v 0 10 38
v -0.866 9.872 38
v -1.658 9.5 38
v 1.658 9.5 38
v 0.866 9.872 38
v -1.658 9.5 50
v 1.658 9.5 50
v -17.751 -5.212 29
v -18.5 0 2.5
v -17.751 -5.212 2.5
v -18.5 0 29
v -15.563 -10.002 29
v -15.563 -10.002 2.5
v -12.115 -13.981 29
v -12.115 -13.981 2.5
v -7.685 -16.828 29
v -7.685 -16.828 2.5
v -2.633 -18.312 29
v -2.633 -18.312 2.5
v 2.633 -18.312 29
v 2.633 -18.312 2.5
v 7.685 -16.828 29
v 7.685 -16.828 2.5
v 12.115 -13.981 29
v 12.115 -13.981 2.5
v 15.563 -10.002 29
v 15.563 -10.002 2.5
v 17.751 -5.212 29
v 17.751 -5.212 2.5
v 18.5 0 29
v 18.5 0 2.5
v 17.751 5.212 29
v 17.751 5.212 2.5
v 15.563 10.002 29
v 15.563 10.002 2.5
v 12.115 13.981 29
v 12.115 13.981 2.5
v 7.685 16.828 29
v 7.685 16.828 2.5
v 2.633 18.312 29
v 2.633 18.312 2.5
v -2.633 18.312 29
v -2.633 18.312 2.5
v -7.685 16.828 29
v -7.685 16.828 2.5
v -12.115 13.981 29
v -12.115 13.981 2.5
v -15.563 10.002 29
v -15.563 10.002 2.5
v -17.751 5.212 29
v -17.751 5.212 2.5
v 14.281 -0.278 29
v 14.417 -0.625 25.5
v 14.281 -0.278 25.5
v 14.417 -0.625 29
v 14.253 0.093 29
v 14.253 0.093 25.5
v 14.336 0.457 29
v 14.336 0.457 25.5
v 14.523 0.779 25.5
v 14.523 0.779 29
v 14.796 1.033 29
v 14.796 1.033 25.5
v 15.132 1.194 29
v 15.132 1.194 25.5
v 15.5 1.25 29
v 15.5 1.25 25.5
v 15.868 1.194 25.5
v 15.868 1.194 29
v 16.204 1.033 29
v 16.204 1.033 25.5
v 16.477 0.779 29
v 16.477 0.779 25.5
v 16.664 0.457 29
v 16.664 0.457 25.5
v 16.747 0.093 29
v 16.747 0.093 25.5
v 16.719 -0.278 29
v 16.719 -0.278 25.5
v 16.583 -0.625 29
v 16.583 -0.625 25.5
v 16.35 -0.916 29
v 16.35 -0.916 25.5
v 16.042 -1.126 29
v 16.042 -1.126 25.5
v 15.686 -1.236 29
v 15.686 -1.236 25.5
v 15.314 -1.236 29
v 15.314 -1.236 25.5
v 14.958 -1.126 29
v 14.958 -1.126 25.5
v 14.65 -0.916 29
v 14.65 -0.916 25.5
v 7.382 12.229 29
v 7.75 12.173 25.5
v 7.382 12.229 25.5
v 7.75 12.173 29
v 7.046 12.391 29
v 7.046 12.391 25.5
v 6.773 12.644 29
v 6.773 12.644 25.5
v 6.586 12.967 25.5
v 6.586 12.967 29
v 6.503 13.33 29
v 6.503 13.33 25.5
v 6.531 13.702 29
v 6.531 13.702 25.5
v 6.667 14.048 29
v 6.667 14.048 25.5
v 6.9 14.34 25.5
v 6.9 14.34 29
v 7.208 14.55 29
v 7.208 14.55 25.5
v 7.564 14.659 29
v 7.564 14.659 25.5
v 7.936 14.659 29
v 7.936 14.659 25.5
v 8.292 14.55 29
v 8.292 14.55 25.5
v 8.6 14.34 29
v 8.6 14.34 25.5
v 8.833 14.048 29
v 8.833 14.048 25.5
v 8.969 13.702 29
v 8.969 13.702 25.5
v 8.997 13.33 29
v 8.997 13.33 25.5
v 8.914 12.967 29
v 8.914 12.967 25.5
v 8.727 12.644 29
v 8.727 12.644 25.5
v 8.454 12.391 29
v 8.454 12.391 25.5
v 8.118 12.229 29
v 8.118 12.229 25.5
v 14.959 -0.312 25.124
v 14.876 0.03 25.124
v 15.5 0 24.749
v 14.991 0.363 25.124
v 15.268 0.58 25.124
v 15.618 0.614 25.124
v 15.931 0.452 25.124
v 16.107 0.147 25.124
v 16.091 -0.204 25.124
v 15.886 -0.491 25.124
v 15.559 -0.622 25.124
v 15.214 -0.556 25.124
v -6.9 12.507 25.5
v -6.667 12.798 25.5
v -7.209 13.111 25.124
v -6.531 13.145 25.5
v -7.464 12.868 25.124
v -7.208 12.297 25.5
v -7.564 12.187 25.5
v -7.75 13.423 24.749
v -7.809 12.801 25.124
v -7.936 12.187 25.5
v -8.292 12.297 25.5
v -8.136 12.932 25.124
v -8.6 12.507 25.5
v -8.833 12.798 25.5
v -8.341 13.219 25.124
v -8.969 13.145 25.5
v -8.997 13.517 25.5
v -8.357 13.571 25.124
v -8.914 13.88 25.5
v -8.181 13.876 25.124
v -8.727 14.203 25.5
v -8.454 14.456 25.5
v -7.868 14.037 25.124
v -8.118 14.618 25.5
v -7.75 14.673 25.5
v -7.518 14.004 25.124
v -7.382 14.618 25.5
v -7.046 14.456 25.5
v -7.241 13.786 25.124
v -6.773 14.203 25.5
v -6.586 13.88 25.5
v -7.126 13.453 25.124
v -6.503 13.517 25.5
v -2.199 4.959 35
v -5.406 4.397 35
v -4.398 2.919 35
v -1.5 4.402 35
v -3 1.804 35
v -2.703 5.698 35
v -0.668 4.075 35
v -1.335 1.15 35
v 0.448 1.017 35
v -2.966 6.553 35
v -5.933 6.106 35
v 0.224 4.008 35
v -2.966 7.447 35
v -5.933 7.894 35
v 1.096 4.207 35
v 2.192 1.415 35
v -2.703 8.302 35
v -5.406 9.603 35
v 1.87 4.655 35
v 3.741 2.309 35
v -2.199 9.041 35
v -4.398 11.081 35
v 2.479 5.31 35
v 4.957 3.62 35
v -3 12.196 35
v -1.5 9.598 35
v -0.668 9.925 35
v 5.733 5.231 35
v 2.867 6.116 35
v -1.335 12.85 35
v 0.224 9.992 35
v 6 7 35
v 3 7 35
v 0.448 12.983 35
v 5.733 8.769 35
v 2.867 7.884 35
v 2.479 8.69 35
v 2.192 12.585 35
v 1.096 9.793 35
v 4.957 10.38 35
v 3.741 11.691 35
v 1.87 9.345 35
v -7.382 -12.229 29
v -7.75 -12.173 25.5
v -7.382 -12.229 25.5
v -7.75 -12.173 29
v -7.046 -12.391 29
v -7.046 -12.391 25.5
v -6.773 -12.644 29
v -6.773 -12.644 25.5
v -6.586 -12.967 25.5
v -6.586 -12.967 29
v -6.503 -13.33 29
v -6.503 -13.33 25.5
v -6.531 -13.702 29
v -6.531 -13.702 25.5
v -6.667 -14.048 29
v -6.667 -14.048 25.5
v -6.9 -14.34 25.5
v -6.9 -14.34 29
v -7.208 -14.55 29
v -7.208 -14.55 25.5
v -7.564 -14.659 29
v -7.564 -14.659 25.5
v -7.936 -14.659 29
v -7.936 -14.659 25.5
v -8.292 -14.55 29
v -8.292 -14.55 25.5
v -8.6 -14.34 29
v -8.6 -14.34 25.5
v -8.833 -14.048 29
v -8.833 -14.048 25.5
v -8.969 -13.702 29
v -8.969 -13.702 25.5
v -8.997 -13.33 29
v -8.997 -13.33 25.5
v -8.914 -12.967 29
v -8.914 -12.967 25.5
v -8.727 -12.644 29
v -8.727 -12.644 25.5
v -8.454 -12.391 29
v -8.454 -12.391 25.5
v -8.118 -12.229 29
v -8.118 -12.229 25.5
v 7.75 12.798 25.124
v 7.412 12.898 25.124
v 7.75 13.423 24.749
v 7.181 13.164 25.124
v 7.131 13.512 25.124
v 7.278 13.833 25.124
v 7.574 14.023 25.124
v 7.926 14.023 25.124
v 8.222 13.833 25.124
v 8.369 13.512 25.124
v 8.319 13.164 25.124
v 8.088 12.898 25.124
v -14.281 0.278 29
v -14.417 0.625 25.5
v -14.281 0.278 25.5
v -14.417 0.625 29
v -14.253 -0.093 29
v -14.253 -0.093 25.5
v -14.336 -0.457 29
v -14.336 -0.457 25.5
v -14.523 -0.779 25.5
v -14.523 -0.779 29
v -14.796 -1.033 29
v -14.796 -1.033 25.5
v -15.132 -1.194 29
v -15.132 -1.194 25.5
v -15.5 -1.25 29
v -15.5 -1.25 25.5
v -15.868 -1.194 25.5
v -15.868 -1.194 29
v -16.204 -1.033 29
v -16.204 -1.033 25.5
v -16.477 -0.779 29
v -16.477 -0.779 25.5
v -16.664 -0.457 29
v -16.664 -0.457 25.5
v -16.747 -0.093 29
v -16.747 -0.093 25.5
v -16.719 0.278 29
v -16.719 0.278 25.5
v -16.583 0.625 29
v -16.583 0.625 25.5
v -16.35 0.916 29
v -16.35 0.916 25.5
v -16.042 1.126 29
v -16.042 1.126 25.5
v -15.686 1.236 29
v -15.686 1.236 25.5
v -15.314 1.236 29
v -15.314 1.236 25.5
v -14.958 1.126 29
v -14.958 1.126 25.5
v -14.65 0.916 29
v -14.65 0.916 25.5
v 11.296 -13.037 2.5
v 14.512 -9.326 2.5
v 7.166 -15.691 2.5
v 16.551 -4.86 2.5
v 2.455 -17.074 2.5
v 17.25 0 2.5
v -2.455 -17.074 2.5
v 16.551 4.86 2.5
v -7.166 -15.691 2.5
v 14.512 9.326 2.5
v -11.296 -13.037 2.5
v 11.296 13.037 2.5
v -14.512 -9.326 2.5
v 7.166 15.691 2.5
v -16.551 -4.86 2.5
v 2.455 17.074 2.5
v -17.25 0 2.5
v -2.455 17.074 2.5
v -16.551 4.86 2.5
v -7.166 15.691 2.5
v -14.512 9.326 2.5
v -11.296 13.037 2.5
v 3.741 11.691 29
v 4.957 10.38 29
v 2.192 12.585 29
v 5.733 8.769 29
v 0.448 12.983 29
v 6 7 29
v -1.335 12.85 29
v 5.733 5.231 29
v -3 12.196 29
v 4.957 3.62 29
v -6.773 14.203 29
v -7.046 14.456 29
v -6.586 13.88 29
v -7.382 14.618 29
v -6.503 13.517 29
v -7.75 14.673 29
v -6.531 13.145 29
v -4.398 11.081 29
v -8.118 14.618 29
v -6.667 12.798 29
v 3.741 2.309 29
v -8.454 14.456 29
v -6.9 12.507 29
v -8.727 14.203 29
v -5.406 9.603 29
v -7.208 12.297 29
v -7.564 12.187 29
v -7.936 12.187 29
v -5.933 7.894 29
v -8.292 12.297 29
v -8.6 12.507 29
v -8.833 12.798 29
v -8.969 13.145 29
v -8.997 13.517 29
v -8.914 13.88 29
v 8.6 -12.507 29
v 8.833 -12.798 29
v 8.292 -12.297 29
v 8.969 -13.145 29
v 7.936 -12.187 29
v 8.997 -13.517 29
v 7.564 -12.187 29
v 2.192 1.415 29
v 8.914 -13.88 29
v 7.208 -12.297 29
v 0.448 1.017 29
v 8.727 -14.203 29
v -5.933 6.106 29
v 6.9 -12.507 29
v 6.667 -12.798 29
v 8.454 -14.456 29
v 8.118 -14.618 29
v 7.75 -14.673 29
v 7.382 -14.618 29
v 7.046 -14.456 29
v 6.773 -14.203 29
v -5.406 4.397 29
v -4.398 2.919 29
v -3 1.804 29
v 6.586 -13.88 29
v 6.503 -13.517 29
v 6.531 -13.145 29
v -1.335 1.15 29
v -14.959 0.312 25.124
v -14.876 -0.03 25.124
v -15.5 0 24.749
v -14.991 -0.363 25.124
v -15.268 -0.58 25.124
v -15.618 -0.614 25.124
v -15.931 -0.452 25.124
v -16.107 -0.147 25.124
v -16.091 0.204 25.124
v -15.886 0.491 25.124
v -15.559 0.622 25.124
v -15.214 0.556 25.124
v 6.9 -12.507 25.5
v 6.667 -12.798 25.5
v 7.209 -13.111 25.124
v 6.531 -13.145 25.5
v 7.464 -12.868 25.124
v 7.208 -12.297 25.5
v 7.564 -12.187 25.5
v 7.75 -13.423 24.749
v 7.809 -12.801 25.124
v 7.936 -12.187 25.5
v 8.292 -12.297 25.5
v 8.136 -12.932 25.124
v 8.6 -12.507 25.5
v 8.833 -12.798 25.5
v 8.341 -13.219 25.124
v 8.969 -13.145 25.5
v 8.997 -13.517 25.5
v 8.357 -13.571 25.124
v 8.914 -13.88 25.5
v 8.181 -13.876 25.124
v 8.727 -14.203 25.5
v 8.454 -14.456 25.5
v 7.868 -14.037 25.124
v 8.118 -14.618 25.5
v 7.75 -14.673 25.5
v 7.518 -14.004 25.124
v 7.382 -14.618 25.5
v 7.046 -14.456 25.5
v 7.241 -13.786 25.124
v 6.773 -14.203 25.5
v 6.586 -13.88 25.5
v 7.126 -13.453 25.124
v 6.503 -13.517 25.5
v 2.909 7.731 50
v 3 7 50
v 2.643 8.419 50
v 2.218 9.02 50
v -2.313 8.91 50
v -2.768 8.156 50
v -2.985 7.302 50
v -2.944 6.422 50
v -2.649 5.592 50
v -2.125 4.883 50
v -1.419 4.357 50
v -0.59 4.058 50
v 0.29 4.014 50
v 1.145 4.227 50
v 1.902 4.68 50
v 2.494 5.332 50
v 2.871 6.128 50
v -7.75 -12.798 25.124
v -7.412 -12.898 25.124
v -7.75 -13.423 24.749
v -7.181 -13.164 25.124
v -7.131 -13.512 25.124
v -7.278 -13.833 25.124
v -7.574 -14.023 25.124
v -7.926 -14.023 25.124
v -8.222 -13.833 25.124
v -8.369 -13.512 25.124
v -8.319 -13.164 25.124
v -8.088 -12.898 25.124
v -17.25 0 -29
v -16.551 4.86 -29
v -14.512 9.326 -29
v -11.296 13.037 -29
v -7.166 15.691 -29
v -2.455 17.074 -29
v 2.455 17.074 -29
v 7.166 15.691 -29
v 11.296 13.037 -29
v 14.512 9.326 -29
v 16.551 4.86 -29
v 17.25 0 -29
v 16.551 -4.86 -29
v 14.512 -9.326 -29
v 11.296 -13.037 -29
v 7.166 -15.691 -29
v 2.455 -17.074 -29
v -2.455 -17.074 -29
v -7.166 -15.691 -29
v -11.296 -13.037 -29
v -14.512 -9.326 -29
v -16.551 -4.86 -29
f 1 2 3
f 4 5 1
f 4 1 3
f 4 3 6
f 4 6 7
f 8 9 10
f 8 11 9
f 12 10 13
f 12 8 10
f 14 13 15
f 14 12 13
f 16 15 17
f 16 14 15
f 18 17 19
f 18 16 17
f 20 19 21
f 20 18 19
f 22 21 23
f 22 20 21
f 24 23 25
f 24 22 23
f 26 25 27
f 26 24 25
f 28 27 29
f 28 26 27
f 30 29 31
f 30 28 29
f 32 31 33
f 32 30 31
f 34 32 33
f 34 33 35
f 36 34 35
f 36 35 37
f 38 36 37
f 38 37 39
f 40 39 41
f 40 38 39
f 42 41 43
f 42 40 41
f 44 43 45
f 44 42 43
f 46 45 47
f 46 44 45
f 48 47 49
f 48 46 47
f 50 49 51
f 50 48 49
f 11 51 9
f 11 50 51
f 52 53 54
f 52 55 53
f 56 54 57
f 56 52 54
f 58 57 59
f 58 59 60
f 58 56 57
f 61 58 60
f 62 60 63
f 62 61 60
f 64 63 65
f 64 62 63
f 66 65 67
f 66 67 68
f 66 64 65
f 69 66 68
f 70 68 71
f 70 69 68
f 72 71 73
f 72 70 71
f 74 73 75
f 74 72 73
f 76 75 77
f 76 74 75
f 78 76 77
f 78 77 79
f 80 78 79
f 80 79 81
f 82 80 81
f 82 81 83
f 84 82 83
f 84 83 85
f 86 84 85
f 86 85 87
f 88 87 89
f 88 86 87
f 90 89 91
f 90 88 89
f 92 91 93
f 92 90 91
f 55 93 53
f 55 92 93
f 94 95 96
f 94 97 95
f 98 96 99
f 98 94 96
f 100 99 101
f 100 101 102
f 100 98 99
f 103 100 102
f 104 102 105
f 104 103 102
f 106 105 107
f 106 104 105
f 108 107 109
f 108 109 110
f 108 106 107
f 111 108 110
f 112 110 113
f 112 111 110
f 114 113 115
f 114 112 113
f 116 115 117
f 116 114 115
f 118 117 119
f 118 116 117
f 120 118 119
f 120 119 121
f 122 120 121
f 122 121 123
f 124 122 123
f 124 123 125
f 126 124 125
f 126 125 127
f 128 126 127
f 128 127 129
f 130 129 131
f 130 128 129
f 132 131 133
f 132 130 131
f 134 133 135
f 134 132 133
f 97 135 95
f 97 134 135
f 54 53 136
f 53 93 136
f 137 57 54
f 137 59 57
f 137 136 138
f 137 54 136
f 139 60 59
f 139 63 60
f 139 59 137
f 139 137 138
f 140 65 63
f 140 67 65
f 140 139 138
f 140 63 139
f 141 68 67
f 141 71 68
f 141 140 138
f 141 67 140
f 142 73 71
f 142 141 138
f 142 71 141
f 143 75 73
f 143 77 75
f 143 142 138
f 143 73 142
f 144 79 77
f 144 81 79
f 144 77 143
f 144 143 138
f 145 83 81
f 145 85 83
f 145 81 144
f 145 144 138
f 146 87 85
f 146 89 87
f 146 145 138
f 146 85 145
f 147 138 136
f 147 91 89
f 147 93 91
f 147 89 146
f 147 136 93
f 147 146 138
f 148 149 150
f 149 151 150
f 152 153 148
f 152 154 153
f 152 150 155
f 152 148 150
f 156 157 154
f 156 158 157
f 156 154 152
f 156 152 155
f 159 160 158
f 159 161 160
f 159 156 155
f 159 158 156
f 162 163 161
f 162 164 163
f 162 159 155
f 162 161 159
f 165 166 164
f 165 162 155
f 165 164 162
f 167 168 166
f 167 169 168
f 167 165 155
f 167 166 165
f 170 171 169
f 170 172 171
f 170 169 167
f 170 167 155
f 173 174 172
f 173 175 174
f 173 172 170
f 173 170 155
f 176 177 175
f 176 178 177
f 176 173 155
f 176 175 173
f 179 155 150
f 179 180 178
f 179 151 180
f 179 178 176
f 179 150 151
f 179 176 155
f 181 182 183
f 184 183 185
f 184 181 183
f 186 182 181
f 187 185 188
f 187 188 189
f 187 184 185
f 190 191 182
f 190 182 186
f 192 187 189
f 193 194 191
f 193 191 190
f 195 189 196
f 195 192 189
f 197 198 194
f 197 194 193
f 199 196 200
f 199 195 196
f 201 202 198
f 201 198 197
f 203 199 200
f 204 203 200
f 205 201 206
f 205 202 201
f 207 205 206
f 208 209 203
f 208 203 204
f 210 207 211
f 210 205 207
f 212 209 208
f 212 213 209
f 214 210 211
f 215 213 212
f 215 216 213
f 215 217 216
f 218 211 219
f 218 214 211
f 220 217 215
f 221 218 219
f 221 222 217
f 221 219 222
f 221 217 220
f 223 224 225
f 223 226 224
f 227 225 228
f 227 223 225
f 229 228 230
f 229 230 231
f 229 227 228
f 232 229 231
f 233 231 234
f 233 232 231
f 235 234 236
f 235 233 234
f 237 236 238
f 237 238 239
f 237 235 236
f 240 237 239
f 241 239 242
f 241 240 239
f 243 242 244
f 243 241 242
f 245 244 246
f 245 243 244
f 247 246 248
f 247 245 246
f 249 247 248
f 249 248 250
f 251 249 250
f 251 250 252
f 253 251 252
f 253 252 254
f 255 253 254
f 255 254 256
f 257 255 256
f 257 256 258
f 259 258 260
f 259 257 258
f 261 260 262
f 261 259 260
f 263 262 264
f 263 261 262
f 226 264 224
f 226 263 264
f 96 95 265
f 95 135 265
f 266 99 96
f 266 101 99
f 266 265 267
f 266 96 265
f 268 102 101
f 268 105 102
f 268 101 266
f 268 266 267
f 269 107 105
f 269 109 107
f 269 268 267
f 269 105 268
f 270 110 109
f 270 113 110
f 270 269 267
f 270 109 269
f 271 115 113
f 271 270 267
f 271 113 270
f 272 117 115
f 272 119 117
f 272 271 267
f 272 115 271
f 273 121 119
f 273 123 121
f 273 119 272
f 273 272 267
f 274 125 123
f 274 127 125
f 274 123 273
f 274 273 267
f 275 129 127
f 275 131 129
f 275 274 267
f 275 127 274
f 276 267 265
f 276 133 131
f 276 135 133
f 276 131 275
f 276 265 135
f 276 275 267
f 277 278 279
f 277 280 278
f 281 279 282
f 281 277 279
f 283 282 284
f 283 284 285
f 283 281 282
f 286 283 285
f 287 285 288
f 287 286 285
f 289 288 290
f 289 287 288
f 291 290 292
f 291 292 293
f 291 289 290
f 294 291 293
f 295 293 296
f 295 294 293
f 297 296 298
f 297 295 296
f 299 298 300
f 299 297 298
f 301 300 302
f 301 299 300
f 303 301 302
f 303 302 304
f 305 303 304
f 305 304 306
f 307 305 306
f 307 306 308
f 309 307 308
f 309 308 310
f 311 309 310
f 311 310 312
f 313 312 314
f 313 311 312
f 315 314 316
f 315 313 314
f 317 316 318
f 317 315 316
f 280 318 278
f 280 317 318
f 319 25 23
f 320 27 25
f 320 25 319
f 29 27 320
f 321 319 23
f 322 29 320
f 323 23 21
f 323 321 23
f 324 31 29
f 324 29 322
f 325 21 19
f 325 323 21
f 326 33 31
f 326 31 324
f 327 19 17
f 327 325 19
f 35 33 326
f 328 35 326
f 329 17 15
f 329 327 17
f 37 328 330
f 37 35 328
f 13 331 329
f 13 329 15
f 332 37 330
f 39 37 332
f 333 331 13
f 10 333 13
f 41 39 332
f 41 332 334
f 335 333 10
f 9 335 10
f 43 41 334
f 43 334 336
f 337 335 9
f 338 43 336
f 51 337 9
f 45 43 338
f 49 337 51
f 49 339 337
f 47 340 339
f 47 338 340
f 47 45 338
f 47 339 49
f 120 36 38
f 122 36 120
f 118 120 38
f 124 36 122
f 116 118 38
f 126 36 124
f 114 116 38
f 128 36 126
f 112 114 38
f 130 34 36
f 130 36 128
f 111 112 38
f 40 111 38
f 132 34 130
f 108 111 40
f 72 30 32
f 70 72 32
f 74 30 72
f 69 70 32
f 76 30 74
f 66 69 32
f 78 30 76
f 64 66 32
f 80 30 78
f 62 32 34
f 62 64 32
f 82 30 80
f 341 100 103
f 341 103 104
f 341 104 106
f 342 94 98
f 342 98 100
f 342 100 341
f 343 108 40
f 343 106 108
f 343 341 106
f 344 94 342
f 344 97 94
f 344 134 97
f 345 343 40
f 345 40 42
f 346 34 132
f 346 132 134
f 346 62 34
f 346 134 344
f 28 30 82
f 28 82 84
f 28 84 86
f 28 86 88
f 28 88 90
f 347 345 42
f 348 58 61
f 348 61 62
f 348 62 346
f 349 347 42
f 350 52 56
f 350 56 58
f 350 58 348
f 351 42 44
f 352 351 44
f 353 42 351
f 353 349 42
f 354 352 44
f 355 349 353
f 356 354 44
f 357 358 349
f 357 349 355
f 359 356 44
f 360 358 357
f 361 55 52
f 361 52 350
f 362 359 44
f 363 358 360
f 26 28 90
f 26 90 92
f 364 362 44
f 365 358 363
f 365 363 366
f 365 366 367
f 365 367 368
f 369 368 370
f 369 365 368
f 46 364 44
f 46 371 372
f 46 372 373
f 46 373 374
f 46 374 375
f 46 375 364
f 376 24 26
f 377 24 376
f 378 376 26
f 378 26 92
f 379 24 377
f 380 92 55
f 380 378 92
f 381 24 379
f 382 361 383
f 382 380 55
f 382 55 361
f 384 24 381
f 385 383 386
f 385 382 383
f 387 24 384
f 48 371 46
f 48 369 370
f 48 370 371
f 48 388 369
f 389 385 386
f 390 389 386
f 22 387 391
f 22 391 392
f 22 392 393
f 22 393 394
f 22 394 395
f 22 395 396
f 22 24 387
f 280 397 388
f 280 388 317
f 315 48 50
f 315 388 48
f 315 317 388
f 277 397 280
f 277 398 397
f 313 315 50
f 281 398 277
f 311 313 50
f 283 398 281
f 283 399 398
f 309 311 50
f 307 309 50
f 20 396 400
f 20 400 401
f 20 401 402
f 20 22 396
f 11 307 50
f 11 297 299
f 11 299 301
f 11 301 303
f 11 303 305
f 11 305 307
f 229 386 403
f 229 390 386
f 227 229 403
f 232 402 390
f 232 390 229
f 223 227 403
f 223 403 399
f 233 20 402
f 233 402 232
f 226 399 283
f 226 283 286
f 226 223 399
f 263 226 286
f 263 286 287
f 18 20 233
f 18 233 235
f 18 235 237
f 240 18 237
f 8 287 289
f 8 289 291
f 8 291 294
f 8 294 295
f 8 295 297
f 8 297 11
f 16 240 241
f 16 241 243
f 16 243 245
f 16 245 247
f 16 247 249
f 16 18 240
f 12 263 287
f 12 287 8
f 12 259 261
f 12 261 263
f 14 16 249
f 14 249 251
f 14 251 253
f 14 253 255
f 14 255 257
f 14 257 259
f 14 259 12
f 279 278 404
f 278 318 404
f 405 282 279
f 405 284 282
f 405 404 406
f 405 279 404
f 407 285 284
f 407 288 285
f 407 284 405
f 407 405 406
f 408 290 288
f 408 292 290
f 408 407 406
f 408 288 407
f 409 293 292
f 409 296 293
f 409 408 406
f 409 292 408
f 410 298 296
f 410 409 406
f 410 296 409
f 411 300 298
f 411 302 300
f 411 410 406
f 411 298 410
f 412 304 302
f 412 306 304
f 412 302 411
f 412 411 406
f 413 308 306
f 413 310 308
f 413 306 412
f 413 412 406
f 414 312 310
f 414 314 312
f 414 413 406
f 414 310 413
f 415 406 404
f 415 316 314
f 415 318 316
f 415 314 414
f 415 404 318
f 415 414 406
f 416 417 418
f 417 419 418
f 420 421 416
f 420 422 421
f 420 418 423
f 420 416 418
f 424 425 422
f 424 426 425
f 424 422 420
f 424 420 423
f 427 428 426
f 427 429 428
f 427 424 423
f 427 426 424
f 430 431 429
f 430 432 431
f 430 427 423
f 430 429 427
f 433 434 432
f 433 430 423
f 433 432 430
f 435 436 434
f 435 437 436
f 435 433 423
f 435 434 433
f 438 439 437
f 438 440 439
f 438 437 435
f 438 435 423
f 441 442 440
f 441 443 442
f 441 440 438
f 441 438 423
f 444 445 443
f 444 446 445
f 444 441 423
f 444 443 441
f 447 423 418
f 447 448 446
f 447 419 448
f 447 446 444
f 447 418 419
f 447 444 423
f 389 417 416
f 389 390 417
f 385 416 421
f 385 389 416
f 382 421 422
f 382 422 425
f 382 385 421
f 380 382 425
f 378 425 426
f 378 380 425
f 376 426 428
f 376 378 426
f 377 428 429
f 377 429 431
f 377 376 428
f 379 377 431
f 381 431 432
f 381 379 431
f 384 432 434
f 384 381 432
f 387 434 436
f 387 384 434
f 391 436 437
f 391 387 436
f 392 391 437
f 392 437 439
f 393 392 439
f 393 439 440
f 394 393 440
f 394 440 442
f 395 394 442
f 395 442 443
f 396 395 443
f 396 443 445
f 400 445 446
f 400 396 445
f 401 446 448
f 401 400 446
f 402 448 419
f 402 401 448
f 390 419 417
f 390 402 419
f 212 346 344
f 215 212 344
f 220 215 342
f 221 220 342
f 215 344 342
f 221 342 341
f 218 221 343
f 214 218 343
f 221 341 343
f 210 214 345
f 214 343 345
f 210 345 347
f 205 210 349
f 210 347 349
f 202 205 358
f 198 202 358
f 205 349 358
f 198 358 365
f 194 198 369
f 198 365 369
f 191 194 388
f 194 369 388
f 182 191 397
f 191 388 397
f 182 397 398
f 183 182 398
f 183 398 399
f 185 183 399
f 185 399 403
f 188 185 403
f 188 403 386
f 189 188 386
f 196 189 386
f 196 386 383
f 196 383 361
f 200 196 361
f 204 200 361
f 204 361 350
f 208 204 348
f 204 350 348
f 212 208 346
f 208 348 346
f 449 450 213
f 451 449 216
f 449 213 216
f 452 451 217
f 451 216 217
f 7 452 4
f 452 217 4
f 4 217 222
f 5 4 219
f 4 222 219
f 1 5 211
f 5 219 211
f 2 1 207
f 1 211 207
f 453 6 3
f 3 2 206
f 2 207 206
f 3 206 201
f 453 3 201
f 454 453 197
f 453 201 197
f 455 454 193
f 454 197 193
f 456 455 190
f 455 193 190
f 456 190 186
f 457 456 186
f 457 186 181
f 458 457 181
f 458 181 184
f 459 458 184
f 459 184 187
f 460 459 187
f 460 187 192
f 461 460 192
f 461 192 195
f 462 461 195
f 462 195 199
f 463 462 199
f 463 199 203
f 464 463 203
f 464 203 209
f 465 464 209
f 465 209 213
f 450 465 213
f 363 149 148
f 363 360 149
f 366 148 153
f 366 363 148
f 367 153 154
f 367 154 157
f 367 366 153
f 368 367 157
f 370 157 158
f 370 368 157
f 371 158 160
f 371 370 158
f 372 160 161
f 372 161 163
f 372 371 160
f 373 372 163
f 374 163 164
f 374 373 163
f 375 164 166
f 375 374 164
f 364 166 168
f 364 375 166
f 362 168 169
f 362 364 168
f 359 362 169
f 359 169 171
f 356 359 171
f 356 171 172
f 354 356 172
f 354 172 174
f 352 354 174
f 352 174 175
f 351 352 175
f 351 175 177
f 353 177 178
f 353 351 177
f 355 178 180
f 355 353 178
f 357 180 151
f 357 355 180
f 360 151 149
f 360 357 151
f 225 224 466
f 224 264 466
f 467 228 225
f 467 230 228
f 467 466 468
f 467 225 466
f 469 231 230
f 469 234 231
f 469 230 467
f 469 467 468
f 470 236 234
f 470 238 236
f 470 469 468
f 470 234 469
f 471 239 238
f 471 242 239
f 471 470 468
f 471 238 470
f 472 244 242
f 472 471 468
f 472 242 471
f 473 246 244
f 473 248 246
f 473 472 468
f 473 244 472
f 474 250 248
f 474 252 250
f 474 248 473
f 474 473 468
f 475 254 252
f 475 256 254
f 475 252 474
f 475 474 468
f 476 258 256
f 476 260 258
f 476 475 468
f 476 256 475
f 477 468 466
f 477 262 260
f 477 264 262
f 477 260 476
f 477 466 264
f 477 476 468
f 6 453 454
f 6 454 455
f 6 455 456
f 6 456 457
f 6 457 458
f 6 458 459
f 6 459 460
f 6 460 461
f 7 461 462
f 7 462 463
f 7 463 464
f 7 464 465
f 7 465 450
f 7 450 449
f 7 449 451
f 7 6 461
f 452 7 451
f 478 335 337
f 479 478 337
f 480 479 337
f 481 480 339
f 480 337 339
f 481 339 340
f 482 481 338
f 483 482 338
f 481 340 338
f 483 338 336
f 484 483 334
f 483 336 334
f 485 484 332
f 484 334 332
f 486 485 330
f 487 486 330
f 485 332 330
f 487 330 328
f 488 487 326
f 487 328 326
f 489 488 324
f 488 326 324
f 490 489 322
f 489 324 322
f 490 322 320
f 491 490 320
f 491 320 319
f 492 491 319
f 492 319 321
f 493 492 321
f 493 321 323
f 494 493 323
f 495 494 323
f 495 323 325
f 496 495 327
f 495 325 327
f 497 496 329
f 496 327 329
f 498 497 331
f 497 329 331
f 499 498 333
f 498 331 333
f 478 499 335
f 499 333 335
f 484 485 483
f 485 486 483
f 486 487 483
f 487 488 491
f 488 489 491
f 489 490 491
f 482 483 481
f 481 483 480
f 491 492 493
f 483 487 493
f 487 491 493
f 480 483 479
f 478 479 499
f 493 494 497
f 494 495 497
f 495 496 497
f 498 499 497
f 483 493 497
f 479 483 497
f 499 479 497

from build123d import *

# Parameters (mm, degrees)
SKETCH1_R           = 18.5
BOSS_EXTRUDE1_DEPTH = 29
CUT_EXTRUDE1_START  = -31.5
SKETCH2_R           = 18.5
SKETCH2_R_2         = 17.25
CUT_EXTRUDE1_DEPTH  = 31.5
SKETCH3_R           = 6
BOSS_EXTRUDE2_DEPTH = 6
SKETCH4_R           = 3
BOSS_EXTRUDE3_DEPTH = 15
CUT_EXTRUDE2_START  = -12
CUT_EXTRUDE2_DEPTH  = 12
CIRPATTERN1_COUNT   = 6


with BuildPart() as part:
    # Sketch1 → Boss-Extrude1 (new, symmetric)
    with BuildSketch(Plane.XY):
        with Locations(Location((0, 0, 0), (0, 0, 180))):
            Circle(SKETCH1_R)
    extrude(amount=BOSS_EXTRUDE1_DEPTH, both=True)

    # Sketch2 → Cut-Extrude1 (cut)
    with BuildSketch(Plane(origin=(0, 0, -29), x_dir=(-1, 0, 0), z_dir=(0, 0, -1)).offset(CUT_EXTRUDE1_START)):
        Circle(SKETCH2_R)
        Circle(SKETCH2_R_2, mode=Mode.SUBTRACT)
    extrude(amount=CUT_EXTRUDE1_DEPTH, mode=Mode.SUBTRACT)

    # Sketch3 → Boss-Extrude2 (add)
    with BuildSketch(Plane.XY.offset(29)):
        with Locations((0, 7)):
            Circle(SKETCH3_R)
    extrude(amount=BOSS_EXTRUDE2_DEPTH)

    # Sketch4 → Boss-Extrude3 (add)
    with BuildSketch(Plane.XY.offset(35)):
        with Locations((0, 7)):
            Circle(SKETCH4_R)
    extrude(amount=BOSS_EXTRUDE3_DEPTH)

    # Sketch5 → Cut-Extrude2 (cut)
    with BuildSketch(Plane.XY.offset(50).offset(CUT_EXTRUDE2_START)):
        with BuildLine():
            Line((-1.658312395, 9.5), (1.658312395, 9.5))
            ThreePointArc((1.658312395, 9.5), (0, 10), (-1.658312395, 9.5))
        make_face()
    extrude(amount=CUT_EXTRUDE2_DEPTH, mode=Mode.SUBTRACT)

    # Sketch7 → M3x0.5 Tapped Hole1 (revolve, cut)
    with BuildSketch(Plane(origin=(7.75, 13.423393759, 29), x_dir=(0, -1, 0), z_dir=(1, 0, 0))):
        Polygon((0, 0), (0, 4.251075774), (1.25, 3.5), (1.25, 0), align=None)
    m3x0_5_tapped_hole1 = revolve(axis=Axis((7.75, 13.423393759, 35.35), (0, 0, -1)), mode=Mode.SUBTRACT)

    # CirPattern1: M3x0.5 Tapped Hole1 ×6 about axis
    cirpattern1_axis = Axis((0, 0, 0), (0, 0, 1))
    for i in range(1, CIRPATTERN1_COUNT):
        add(m3x0_5_tapped_hole1.rotate(cirpattern1_axis, i * 360 / CIRPATTERN1_COUNT), mode=Mode.SUBTRACT)


solid = part.part
